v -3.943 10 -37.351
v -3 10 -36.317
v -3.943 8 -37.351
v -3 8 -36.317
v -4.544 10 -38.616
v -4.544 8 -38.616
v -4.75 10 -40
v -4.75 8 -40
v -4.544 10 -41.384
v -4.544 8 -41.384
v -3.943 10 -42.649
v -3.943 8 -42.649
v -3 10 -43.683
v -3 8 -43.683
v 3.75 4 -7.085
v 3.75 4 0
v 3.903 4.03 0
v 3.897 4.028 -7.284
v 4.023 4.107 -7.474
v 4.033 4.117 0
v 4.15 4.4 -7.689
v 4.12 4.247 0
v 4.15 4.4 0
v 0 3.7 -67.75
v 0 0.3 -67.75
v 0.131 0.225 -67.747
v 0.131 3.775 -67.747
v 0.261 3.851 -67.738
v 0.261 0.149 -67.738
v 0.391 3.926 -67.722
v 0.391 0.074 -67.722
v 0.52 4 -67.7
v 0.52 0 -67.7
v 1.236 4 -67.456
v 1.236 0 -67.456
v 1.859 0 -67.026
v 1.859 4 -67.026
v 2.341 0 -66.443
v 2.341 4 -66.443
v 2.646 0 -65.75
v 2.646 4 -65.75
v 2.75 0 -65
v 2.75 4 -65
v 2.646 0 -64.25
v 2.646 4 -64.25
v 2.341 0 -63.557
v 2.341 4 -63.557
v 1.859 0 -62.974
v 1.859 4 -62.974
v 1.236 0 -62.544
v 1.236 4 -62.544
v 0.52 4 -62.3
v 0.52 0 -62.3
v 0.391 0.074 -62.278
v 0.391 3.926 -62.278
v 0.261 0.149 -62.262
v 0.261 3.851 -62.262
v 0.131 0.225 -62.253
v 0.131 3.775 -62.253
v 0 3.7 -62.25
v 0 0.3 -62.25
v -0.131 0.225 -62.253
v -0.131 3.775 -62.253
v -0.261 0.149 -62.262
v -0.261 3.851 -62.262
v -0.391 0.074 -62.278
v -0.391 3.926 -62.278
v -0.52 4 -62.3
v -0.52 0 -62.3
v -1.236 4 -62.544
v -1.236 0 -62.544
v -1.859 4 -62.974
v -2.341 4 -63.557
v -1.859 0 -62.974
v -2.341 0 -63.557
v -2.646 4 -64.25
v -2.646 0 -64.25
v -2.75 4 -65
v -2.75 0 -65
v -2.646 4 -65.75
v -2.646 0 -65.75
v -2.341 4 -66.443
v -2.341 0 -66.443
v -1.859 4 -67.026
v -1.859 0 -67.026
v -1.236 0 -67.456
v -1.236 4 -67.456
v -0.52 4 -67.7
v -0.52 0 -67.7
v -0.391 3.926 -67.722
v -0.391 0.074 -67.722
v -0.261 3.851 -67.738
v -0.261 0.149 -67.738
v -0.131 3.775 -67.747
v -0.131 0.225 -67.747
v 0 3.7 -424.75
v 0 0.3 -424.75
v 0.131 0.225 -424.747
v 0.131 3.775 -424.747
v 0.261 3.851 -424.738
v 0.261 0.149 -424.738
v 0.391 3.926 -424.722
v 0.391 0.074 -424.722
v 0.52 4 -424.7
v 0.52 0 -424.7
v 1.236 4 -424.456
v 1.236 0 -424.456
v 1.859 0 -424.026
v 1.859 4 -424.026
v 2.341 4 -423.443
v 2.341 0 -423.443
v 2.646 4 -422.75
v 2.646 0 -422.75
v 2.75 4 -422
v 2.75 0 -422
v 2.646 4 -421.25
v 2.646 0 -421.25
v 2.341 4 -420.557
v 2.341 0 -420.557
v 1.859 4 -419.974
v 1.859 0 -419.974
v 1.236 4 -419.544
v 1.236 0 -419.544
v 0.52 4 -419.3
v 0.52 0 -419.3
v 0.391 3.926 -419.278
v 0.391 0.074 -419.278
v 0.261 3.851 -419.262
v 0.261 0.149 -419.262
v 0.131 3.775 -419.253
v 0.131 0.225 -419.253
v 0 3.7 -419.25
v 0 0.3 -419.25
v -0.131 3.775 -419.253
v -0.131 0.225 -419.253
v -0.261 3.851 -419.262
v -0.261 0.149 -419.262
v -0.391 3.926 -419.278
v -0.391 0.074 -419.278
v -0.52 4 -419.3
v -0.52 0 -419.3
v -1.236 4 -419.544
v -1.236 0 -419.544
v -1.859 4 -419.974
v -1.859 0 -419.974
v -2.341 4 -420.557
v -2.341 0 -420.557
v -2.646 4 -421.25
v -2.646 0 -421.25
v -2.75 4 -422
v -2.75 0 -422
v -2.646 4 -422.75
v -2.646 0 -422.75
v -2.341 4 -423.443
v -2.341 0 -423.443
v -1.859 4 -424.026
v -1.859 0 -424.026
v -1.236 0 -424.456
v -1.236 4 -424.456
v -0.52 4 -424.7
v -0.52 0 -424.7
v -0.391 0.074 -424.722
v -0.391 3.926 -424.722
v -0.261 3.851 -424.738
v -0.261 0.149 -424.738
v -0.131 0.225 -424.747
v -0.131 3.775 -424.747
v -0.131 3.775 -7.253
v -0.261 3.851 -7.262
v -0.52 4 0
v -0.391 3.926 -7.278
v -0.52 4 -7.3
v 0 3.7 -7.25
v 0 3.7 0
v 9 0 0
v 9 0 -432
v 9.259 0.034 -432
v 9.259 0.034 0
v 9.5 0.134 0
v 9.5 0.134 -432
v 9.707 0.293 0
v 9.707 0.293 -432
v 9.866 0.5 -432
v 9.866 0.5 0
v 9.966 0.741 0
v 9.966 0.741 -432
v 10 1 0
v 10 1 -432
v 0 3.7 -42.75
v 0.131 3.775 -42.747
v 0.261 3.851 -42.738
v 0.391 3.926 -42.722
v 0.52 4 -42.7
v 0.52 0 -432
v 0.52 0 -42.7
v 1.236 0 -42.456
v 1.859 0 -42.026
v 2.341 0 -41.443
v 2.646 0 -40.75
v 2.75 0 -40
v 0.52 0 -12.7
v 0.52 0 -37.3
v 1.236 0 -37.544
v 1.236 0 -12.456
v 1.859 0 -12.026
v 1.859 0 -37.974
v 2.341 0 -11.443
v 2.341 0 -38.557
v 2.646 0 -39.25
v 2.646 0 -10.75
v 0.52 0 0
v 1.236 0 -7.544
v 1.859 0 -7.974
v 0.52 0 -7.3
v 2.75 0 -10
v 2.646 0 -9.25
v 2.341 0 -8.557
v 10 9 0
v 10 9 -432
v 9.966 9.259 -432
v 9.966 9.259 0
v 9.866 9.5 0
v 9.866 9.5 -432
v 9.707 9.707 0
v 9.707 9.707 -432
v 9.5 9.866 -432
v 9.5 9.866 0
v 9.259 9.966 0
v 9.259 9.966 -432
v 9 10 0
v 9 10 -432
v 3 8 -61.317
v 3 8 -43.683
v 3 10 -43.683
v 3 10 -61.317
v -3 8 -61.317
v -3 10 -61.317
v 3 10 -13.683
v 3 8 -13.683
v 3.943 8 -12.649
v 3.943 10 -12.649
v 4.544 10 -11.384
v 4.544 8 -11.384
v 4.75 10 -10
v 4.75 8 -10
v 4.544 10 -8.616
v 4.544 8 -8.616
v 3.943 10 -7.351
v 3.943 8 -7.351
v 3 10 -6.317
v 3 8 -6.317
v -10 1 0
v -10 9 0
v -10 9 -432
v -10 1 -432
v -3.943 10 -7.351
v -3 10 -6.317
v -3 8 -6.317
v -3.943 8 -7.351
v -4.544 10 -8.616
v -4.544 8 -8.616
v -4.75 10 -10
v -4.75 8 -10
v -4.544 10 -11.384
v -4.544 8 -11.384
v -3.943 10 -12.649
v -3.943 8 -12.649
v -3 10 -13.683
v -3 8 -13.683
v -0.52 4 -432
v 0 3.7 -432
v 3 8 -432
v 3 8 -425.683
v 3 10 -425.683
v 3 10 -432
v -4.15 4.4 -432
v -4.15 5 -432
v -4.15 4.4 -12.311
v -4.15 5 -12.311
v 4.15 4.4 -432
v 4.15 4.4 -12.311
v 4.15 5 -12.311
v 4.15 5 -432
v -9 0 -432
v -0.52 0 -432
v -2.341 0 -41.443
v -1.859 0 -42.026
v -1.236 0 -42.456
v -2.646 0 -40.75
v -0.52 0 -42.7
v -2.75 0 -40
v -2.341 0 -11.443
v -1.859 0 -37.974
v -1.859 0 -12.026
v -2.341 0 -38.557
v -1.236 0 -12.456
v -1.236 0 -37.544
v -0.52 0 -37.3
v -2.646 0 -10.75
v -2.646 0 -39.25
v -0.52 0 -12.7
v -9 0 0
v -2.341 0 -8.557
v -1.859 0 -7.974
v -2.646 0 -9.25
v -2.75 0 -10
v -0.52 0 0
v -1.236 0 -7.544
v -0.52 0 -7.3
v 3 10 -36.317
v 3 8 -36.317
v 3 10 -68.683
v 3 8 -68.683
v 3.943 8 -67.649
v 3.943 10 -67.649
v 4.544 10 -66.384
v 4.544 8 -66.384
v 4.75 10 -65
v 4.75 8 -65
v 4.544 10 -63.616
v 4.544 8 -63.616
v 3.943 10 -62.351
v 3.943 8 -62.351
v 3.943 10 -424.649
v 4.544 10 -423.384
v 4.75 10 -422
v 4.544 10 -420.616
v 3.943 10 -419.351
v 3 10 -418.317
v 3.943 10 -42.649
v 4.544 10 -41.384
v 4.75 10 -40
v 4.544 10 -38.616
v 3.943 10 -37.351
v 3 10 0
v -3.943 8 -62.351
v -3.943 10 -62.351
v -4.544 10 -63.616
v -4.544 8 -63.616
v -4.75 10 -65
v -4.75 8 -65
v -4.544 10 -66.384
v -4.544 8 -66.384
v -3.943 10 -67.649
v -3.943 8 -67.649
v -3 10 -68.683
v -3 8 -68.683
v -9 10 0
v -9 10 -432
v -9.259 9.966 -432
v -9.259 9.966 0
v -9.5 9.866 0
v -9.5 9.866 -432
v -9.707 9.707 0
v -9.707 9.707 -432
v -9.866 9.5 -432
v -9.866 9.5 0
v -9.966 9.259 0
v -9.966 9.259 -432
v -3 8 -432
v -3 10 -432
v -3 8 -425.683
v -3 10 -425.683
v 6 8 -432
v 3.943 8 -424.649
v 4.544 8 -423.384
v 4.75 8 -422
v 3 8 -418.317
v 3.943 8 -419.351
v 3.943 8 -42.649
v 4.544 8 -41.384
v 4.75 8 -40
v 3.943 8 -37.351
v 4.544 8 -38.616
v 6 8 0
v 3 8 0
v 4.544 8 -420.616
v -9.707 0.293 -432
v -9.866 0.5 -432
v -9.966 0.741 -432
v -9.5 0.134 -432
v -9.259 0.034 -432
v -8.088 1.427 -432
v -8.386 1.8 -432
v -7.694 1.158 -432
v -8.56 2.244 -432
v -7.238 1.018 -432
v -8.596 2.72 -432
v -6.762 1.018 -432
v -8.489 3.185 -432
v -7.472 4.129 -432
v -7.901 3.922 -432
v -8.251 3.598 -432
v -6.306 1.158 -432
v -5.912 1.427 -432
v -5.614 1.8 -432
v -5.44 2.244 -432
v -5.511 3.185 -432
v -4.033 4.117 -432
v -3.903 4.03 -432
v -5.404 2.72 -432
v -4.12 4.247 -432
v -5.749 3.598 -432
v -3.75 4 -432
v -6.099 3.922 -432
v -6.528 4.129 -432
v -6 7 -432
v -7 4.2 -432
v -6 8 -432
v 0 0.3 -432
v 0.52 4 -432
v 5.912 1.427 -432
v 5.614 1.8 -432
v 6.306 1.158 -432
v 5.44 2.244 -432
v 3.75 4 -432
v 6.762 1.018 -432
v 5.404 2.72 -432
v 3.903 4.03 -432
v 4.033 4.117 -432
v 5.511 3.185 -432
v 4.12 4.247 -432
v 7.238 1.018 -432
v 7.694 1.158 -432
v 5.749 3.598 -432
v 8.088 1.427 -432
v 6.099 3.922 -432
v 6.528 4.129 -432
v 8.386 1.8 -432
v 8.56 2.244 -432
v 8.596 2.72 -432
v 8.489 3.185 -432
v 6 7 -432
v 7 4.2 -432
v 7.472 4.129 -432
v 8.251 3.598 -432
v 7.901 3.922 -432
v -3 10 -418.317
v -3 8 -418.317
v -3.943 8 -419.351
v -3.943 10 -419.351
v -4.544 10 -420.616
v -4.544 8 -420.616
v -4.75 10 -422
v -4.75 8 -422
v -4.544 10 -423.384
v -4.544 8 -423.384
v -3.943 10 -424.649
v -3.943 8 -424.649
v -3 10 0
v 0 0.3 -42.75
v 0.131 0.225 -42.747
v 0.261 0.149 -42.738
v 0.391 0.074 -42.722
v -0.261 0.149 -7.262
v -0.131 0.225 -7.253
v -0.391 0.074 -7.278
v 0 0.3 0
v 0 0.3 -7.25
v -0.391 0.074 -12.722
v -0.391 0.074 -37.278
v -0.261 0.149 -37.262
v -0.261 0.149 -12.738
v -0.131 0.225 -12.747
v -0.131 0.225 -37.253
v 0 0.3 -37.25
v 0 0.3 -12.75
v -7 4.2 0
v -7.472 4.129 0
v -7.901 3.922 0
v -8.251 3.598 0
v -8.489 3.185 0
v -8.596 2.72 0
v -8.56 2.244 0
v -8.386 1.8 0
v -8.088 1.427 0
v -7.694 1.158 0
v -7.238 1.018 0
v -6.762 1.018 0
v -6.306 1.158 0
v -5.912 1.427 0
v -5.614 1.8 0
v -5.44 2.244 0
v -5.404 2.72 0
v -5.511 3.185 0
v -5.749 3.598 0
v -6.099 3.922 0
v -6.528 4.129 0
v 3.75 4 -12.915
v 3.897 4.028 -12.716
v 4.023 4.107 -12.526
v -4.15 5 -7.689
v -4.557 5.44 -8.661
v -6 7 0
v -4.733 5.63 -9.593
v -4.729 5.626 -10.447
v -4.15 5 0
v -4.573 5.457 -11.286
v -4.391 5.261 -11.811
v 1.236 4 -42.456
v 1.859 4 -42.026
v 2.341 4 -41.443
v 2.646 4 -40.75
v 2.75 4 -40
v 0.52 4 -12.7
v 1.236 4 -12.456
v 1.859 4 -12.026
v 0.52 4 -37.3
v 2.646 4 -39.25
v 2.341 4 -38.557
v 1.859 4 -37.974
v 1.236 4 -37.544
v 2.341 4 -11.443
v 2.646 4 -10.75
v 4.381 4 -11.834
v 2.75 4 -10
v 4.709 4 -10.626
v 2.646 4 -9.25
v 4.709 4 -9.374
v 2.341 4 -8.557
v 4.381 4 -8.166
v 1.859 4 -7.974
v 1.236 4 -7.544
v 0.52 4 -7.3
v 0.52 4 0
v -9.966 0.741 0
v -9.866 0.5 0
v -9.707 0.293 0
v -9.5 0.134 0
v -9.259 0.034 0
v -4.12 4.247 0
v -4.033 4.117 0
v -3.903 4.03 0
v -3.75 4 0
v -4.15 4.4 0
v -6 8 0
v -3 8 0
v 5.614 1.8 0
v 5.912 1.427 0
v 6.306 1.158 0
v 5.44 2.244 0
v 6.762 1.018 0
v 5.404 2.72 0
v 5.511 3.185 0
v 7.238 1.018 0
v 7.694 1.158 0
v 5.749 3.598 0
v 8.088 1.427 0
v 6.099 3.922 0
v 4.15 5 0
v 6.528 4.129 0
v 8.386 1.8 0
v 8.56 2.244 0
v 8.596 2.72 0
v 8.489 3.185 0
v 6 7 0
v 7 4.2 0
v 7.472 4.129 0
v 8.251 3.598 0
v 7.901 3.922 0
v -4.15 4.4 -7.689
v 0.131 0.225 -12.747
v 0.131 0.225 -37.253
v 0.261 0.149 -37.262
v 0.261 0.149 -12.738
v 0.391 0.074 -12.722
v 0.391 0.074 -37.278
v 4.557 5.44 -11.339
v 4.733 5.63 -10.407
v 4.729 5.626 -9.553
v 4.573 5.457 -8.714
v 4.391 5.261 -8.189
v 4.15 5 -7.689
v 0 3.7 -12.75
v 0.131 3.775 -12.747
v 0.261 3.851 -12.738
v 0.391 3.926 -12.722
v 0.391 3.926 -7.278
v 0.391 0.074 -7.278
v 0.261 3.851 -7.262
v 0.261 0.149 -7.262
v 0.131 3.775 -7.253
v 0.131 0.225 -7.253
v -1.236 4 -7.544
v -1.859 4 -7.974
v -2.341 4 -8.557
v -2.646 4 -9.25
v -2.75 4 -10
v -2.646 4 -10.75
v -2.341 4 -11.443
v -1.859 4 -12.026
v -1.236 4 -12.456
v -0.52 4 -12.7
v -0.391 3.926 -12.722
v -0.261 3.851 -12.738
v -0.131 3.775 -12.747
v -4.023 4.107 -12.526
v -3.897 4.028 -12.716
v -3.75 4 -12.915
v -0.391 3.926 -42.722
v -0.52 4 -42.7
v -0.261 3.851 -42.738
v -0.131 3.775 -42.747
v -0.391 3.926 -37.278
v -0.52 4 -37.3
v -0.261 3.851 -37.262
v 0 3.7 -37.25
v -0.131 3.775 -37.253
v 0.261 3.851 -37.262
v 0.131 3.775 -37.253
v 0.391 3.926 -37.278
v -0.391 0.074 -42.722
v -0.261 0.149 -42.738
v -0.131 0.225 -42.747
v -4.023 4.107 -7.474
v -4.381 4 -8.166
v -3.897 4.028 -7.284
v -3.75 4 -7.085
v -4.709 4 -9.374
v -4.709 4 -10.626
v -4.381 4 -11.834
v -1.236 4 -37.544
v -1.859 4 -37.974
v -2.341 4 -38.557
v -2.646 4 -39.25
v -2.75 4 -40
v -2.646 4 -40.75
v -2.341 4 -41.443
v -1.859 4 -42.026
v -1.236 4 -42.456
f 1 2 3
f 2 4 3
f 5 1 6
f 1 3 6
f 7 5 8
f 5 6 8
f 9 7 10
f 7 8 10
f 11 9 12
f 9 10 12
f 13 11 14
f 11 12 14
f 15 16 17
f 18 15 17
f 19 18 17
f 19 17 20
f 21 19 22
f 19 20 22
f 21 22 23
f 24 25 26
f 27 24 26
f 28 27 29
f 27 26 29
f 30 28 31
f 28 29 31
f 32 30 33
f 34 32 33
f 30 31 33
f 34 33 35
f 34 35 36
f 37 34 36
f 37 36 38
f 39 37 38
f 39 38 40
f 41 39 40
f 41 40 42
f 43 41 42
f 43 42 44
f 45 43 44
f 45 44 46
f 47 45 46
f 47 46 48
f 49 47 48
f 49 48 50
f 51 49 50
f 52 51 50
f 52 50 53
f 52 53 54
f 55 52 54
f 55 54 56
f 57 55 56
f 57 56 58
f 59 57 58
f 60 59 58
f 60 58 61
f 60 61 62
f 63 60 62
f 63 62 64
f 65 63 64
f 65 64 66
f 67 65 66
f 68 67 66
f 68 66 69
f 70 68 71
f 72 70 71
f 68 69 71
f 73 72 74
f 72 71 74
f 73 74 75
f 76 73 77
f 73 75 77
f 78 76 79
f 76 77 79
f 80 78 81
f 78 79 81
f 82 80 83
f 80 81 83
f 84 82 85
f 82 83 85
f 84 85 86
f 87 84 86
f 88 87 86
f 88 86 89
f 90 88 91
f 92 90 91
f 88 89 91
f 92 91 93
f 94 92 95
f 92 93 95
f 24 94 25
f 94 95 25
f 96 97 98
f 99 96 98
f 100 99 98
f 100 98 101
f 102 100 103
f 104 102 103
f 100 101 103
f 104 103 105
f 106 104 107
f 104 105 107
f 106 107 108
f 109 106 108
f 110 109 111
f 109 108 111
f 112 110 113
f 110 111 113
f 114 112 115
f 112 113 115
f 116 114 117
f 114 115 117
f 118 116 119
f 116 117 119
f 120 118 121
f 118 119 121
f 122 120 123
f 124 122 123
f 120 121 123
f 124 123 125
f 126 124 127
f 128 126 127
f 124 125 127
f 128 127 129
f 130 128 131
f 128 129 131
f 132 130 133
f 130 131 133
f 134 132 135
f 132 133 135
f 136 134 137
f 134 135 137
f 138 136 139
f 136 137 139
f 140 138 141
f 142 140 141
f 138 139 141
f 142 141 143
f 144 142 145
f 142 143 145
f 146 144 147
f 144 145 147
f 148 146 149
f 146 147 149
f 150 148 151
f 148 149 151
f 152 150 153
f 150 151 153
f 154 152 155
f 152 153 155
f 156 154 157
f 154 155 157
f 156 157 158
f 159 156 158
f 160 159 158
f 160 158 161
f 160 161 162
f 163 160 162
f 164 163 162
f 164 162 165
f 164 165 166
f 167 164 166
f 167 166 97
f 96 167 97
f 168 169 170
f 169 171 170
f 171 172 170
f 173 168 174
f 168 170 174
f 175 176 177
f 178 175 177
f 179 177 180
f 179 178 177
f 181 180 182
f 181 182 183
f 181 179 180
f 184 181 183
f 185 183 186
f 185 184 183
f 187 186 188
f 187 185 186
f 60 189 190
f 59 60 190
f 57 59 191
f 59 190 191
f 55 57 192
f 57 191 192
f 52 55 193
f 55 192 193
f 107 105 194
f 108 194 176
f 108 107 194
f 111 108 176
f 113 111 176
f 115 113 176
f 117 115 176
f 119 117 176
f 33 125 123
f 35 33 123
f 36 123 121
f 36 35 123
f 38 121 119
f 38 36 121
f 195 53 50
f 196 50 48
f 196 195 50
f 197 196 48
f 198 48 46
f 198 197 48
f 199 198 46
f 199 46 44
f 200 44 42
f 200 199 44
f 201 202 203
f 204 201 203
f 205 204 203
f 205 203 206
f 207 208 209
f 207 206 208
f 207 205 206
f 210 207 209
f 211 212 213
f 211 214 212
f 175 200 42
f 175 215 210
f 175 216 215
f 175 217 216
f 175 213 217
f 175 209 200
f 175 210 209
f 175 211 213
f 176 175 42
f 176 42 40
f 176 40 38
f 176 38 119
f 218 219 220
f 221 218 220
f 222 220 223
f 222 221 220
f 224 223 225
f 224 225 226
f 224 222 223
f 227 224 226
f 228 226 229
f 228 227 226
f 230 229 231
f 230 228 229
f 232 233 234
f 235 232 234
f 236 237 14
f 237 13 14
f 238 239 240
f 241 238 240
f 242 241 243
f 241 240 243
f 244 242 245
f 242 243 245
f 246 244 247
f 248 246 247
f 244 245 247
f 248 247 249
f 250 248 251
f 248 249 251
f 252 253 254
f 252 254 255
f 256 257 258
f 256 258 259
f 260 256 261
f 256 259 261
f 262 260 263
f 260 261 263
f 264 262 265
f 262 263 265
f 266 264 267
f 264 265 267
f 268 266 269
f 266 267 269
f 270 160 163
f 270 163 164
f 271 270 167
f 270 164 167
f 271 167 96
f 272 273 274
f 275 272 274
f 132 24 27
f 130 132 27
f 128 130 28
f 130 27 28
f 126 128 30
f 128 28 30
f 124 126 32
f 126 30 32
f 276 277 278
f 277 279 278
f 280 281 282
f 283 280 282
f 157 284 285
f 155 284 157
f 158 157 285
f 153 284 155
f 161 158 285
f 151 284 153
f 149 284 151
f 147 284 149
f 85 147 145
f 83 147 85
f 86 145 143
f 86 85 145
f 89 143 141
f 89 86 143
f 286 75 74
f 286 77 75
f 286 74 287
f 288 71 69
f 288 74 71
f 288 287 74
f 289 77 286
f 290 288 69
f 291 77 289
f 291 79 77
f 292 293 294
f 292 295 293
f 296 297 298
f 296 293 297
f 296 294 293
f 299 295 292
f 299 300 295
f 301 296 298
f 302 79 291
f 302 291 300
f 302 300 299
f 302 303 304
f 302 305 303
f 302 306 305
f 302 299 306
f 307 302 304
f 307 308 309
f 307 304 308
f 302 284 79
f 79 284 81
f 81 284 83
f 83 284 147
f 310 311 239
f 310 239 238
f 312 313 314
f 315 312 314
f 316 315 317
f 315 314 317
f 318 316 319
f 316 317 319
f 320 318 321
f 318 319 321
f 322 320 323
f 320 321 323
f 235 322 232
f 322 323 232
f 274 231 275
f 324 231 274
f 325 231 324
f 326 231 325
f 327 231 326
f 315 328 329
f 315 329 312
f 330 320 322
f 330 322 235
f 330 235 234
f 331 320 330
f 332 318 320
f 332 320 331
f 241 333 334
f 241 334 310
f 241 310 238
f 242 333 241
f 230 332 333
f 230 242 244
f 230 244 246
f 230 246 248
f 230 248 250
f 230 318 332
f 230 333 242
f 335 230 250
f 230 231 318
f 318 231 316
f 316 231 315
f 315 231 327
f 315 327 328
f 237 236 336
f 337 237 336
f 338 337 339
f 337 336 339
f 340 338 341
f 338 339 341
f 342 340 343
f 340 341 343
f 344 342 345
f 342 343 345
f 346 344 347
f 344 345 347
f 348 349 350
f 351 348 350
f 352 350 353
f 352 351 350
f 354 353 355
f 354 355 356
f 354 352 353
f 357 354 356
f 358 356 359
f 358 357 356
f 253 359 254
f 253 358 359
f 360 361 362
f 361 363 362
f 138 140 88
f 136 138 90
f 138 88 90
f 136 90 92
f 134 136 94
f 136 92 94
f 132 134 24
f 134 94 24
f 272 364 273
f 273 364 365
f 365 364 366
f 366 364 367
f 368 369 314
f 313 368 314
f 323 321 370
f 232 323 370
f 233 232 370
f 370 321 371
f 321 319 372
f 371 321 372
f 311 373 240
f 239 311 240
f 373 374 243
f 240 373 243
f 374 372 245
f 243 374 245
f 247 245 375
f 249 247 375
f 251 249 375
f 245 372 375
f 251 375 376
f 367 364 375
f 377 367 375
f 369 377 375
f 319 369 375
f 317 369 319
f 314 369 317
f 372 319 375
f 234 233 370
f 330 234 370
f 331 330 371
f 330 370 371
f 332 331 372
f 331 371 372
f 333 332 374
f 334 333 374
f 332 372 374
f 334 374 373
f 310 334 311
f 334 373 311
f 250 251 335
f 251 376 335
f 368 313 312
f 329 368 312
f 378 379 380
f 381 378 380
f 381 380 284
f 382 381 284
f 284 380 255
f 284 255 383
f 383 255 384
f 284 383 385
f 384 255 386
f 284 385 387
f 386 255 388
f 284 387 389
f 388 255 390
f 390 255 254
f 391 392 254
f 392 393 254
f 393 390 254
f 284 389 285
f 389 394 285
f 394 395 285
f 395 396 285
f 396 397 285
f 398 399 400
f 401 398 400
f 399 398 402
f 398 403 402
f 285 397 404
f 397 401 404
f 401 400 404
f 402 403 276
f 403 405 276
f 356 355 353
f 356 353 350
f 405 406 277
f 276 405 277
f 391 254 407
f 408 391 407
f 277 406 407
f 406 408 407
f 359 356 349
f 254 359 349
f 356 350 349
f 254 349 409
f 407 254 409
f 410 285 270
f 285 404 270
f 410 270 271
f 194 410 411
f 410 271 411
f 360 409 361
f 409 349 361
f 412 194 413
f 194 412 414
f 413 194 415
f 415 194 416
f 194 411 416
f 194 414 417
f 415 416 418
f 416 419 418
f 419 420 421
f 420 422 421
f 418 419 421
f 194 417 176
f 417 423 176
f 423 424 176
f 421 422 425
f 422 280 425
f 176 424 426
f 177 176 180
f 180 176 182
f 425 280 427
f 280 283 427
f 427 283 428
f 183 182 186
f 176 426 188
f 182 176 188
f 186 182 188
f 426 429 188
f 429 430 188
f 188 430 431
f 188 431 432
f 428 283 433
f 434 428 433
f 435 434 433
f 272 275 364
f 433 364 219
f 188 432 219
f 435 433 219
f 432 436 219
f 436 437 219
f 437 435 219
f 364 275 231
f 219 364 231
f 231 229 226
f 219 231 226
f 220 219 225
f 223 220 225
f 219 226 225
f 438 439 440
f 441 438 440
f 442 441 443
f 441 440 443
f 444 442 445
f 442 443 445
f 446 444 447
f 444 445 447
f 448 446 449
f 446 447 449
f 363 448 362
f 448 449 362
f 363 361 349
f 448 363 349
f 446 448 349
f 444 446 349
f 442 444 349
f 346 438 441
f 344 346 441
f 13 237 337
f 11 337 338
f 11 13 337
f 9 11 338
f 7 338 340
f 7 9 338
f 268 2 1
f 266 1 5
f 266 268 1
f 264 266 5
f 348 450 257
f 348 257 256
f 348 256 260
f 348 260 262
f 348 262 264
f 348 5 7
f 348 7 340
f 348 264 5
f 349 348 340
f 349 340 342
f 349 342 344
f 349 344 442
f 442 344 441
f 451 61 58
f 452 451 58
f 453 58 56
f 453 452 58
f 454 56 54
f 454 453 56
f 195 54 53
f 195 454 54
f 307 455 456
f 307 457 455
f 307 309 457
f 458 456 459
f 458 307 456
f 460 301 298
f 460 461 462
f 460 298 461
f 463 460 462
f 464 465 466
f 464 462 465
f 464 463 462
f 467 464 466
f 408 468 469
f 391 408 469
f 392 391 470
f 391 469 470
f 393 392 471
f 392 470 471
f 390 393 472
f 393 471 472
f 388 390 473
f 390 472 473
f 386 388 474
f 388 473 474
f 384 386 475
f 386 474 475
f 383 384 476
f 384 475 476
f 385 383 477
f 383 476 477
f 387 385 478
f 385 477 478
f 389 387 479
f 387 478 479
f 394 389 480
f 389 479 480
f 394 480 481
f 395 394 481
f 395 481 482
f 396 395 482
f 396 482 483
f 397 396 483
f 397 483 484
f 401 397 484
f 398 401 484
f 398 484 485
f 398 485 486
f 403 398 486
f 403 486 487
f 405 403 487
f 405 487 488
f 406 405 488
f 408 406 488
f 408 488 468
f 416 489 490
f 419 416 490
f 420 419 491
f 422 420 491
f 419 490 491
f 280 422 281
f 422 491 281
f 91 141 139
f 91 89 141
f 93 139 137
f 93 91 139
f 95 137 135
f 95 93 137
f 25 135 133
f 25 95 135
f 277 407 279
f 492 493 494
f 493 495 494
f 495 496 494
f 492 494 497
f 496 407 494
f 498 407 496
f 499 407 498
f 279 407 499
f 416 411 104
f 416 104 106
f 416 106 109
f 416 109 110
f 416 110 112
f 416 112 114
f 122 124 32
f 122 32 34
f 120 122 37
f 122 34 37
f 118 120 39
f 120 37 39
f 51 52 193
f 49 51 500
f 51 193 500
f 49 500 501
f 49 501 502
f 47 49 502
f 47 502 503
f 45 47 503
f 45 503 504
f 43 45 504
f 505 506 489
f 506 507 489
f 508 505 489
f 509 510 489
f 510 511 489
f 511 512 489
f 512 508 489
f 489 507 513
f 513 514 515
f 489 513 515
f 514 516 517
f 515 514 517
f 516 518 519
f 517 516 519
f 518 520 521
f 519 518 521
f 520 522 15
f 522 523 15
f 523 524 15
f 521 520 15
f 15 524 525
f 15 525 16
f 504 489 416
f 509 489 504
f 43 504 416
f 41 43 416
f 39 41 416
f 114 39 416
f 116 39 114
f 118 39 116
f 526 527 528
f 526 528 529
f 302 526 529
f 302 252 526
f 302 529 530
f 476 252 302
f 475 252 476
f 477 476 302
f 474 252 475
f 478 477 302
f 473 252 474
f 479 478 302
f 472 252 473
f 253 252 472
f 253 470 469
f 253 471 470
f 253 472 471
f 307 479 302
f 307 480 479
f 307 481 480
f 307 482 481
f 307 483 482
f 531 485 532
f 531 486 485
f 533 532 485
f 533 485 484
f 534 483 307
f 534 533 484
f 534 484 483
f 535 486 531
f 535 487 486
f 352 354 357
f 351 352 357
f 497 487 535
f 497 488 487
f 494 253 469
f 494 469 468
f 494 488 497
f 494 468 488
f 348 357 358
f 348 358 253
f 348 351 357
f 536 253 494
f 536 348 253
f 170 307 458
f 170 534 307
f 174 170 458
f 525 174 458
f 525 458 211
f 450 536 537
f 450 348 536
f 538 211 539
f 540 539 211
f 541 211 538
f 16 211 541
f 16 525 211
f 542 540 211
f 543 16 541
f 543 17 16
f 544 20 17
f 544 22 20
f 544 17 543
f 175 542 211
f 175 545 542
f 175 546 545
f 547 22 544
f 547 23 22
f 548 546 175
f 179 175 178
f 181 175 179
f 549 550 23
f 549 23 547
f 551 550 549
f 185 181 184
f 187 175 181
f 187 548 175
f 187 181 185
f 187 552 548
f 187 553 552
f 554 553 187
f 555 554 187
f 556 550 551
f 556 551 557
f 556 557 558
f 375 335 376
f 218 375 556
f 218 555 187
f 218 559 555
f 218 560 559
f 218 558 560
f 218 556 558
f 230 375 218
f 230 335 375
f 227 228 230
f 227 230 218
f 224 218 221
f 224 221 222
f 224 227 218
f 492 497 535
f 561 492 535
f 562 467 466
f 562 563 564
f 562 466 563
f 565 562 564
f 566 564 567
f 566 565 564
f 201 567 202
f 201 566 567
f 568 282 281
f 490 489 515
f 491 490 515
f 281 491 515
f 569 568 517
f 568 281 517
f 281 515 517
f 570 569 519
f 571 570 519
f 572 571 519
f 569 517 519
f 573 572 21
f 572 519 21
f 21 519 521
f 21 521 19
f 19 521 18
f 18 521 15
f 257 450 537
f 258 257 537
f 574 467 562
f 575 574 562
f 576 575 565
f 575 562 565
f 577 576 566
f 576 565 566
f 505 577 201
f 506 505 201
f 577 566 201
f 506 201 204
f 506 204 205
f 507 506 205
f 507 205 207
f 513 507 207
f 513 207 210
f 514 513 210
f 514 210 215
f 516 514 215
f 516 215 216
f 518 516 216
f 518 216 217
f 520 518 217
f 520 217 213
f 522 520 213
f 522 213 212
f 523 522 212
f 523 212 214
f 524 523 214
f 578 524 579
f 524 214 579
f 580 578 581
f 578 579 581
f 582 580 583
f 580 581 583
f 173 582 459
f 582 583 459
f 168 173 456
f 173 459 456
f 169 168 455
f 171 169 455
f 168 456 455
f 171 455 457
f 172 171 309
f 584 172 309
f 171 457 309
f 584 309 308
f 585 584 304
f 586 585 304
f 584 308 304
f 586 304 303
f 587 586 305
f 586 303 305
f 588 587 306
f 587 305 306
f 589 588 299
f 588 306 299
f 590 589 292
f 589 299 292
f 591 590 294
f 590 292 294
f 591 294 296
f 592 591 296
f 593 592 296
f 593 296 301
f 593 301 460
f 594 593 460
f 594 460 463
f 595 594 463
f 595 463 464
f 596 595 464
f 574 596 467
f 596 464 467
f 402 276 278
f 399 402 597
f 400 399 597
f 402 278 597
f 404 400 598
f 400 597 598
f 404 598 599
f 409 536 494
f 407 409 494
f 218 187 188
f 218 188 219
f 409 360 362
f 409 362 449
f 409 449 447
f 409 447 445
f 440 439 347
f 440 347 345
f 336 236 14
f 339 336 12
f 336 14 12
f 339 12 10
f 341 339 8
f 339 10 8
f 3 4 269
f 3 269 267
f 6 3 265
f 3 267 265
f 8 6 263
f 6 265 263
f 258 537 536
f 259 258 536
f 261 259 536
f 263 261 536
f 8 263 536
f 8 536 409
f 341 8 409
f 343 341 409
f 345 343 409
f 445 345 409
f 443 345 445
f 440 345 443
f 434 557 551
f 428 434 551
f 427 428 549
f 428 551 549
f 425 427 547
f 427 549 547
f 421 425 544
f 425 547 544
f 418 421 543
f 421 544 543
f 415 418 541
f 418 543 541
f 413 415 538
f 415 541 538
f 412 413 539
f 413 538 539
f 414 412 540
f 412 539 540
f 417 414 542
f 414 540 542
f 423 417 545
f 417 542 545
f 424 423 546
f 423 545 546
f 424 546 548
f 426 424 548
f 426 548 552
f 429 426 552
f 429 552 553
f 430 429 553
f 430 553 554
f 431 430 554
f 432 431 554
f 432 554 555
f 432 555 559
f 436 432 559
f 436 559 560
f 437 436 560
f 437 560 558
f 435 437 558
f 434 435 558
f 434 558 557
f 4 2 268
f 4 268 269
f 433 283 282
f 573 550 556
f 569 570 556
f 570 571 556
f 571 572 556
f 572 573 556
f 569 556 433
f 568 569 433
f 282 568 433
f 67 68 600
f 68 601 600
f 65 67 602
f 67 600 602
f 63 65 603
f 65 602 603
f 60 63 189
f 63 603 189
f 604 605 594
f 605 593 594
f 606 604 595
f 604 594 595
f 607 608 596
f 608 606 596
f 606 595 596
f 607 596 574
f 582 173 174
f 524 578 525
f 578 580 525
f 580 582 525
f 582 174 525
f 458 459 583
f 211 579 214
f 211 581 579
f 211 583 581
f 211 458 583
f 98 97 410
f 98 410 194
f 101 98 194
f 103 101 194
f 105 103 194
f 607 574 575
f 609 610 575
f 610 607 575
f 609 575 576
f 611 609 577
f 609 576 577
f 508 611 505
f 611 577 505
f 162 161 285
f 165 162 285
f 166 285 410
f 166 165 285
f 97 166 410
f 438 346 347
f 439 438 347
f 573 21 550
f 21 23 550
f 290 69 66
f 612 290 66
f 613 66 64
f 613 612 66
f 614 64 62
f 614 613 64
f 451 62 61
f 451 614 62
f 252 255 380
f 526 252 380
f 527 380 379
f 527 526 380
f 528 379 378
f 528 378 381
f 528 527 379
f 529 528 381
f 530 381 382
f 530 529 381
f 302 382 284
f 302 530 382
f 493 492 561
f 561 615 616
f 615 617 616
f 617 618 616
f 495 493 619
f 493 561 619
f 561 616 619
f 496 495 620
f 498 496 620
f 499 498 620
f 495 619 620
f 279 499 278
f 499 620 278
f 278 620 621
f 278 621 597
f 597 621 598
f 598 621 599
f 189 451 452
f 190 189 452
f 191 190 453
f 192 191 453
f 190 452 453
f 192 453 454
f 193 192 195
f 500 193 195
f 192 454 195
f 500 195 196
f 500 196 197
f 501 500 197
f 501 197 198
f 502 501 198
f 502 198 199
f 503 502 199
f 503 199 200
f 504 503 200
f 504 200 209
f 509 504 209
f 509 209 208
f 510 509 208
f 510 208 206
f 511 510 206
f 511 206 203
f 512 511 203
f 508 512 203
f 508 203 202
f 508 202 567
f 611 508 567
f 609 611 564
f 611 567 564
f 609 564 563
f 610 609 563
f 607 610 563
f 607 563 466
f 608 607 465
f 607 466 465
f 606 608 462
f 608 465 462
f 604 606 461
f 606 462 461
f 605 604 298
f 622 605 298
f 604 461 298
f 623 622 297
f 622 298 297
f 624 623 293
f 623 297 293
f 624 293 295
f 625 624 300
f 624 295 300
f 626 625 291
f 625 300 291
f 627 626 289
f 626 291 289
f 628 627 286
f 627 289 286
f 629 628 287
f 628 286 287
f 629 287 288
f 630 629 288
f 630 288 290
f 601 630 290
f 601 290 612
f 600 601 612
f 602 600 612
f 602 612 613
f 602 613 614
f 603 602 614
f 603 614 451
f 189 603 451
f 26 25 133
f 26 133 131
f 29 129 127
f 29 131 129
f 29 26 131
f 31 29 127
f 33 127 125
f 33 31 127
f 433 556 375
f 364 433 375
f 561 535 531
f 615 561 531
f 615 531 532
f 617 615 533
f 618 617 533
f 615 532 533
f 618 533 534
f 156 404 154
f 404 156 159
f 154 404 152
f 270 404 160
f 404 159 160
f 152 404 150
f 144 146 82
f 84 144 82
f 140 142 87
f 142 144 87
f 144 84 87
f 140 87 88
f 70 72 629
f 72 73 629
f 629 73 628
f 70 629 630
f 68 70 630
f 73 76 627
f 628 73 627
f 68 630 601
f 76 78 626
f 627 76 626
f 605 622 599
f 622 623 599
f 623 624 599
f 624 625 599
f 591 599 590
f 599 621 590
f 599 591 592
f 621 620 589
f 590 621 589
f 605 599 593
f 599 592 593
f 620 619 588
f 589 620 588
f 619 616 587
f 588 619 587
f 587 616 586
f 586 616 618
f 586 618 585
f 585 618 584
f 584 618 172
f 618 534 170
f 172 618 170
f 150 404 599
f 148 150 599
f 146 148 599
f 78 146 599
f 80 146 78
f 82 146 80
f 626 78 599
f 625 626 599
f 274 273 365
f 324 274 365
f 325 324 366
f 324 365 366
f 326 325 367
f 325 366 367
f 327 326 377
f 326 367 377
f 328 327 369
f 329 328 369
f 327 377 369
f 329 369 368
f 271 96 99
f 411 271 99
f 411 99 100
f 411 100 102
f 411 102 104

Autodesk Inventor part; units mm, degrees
ref_plane "YZ Plane" through (0, 0, 0) normal (1, 0, 0) x (0, 1, 0)
ref_plane "XZ Plane" through (0, 0, 0) normal (0, 1, 0) x (-1, 0, 0)
ref_plane "XY Plane" through (0, 0, 0) normal (0, 0, 1) x (1, 0, 0)
sketch "_____1" plane through (0, 0, 0) normal (0, 0, 1) x (1, 0, 0)
  arc A0 (-10, 1) -> (-9, 0) centre (-9, 1) ccw
  line L0 (-9, 0) -> (-0.5196, 0)
  line L1 (-0.5196, 0) -> (0, 0.3)
  line L2 (0, 0.3) -> (0.5196, 0)
  line L3 (0.5196, 0) -> (9, 0)
  arc A1 (9, 0) -> (10, 1) centre (9, 1) ccw
  line L4 (10, 1) -> (10, 9)
  arc A2 (10, 9) -> (9, 10) centre (9, 9) ccw
  line L5 (9, 10) -> (-9, 10)
  arc A3 (-9, 10) -> (-10, 9) centre (-9, 9) ccw
  line L6 (-10, 9) -> (-10, 1)
extrude "Extrusion1" add sketch "_____1" against normal blind 432
sketch "_____2" plane through (0, 0, 0) normal (0, 0, 1) x (1, 0, 0)
  line L0 (-6, 8) -> (-6, 7)
  line L1 (-6, 7) -> (-4.15, 5)
  line L2 (-4.15, 5) -> (-4.15, 4.4)
  arc A0 (-4.15, 4.4) -> (-3.75, 4) centre (-3.75, 4.4) ccw
  line L3 (-3.75, 4) -> (-0.5196, 4)
  line L4 (-0.5196, 4) -> (0, 3.7)
  line L5 (0, 3.7) -> (0.5196, 4)
  line L6 (0.5196, 4) -> (3.75, 4)
  arc A1 (3.75, 4) -> (4.15, 4.4) centre (3.75, 4.4) ccw
  line L7 (4.15, 4.4) -> (4.15, 5)
  line L8 (4.15, 5) -> (6, 7)
  line L9 (6, 7) -> (6, 8)
  line L10 (6, 8) -> (3, 8)
  line L11 (3, 8) -> (3, 10)
  line L12 (3, 10) -> (-3, 10)
  line L13 (-3, 10) -> (-3, 8)
  line L14 (-3, 8) -> (-6, 8)
extrude "Extrusion2" cut sketch "_____2" against normal blind 432
sketch "Sketch3" plane through (0, 0, -432) normal (0, 0, -1) x (-1, 0, 0)
  point P0 (-7, 2.6)
hole "Hole1" at (7, 2.6, -432) direction (0, 0, 1) diameter 3.2 depth 432
sketch "Sketch4" plane through (0, 0, -432) normal (0, 0, -1) x (-1, 0, 0)
  point P0 (7, 2.6)
hole "Hole2" at (-7, 2.6, -432) direction (0, 0, 1) diameter 3.2 depth 432
sketch "_____5" plane through (0, 0, 0) normal (1, 0, 0) x (0, 0, -1)
  line L0 (10, 0) -> (10, 10)
  line L1 (10, 10) -> (14.75, 10)
  line L2 (14.75, 10) -> (14.75, 4)
  line L3 (14.75, 4) -> (12.75, 4)
  line L4 (12.75, 4) -> (12.75, 0)
  line L5 (12.75, 0) -> (10, 0)
  line L6 (10, 0) -> (10, 10)
revolve "Revolution1" cut sketch "_____5" angle 360 about axis through (0, 0, -10) along (0, -1, 0)
sketch "_____6" plane through (0, 0, 0) normal (1, 0, 0) x (0, 0, -1)
  line L0 (40, 0) -> (40, 10)
  line L1 (40, 10) -> (44.75, 10)
  line L2 (44.75, 10) -> (44.75, 7)
  line L3 (44.75, 7) -> (42.75, 7)
  line L4 (42.75, 7) -> (42.75, 0)
  line L5 (42.75, 0) -> (40, 0)
  line L6 (40, 0) -> (40, 10)
revolve "Revolution2" cut sketch "_____6" angle 360 about axis through (0, 0, -40) along (0, -1, 0)
sketch "_____7" plane through (0, 0, 0) normal (1, 0, 0) x (0, 0, -1)
  line L0 (65, 0) -> (65, 10)
  line L1 (65, 10) -> (69.75, 10)
  line L2 (69.75, 10) -> (69.75, 7)
  line L3 (69.75, 7) -> (67.75, 7)
  line L4 (67.75, 7) -> (67.75, 0)
  line L5 (67.75, 0) -> (65, 0)
  line L6 (65, 0) -> (65, 10)
revolve "Revolution3" cut sketch "_____7" angle 360 about axis through (0, 0, -65) along (0, -1, 0)
sketch "_____8" plane through (0, 0, 0) normal (1, 0, 0) x (0, 0, -1)
  line L0 (422, 0) -> (422, 10)
  line L1 (422, 10) -> (426.75, 10)
  line L2 (426.75, 10) -> (426.75, 7)
  line L3 (426.75, 7) -> (424.75, 7)
  line L4 (424.75, 7) -> (424.75, 0)
  line L5 (424.75, 0) -> (422, 0)
  line L6 (422, 0) -> (422, 10)
revolve "Revolution4" cut sketch "_____8" angle 360 about axis through (0, 0, -422) along (0, -1, 0)
properties part number "HFSFIN5-1020-432-Z5-XA10-XB40-XC65-XD422"
